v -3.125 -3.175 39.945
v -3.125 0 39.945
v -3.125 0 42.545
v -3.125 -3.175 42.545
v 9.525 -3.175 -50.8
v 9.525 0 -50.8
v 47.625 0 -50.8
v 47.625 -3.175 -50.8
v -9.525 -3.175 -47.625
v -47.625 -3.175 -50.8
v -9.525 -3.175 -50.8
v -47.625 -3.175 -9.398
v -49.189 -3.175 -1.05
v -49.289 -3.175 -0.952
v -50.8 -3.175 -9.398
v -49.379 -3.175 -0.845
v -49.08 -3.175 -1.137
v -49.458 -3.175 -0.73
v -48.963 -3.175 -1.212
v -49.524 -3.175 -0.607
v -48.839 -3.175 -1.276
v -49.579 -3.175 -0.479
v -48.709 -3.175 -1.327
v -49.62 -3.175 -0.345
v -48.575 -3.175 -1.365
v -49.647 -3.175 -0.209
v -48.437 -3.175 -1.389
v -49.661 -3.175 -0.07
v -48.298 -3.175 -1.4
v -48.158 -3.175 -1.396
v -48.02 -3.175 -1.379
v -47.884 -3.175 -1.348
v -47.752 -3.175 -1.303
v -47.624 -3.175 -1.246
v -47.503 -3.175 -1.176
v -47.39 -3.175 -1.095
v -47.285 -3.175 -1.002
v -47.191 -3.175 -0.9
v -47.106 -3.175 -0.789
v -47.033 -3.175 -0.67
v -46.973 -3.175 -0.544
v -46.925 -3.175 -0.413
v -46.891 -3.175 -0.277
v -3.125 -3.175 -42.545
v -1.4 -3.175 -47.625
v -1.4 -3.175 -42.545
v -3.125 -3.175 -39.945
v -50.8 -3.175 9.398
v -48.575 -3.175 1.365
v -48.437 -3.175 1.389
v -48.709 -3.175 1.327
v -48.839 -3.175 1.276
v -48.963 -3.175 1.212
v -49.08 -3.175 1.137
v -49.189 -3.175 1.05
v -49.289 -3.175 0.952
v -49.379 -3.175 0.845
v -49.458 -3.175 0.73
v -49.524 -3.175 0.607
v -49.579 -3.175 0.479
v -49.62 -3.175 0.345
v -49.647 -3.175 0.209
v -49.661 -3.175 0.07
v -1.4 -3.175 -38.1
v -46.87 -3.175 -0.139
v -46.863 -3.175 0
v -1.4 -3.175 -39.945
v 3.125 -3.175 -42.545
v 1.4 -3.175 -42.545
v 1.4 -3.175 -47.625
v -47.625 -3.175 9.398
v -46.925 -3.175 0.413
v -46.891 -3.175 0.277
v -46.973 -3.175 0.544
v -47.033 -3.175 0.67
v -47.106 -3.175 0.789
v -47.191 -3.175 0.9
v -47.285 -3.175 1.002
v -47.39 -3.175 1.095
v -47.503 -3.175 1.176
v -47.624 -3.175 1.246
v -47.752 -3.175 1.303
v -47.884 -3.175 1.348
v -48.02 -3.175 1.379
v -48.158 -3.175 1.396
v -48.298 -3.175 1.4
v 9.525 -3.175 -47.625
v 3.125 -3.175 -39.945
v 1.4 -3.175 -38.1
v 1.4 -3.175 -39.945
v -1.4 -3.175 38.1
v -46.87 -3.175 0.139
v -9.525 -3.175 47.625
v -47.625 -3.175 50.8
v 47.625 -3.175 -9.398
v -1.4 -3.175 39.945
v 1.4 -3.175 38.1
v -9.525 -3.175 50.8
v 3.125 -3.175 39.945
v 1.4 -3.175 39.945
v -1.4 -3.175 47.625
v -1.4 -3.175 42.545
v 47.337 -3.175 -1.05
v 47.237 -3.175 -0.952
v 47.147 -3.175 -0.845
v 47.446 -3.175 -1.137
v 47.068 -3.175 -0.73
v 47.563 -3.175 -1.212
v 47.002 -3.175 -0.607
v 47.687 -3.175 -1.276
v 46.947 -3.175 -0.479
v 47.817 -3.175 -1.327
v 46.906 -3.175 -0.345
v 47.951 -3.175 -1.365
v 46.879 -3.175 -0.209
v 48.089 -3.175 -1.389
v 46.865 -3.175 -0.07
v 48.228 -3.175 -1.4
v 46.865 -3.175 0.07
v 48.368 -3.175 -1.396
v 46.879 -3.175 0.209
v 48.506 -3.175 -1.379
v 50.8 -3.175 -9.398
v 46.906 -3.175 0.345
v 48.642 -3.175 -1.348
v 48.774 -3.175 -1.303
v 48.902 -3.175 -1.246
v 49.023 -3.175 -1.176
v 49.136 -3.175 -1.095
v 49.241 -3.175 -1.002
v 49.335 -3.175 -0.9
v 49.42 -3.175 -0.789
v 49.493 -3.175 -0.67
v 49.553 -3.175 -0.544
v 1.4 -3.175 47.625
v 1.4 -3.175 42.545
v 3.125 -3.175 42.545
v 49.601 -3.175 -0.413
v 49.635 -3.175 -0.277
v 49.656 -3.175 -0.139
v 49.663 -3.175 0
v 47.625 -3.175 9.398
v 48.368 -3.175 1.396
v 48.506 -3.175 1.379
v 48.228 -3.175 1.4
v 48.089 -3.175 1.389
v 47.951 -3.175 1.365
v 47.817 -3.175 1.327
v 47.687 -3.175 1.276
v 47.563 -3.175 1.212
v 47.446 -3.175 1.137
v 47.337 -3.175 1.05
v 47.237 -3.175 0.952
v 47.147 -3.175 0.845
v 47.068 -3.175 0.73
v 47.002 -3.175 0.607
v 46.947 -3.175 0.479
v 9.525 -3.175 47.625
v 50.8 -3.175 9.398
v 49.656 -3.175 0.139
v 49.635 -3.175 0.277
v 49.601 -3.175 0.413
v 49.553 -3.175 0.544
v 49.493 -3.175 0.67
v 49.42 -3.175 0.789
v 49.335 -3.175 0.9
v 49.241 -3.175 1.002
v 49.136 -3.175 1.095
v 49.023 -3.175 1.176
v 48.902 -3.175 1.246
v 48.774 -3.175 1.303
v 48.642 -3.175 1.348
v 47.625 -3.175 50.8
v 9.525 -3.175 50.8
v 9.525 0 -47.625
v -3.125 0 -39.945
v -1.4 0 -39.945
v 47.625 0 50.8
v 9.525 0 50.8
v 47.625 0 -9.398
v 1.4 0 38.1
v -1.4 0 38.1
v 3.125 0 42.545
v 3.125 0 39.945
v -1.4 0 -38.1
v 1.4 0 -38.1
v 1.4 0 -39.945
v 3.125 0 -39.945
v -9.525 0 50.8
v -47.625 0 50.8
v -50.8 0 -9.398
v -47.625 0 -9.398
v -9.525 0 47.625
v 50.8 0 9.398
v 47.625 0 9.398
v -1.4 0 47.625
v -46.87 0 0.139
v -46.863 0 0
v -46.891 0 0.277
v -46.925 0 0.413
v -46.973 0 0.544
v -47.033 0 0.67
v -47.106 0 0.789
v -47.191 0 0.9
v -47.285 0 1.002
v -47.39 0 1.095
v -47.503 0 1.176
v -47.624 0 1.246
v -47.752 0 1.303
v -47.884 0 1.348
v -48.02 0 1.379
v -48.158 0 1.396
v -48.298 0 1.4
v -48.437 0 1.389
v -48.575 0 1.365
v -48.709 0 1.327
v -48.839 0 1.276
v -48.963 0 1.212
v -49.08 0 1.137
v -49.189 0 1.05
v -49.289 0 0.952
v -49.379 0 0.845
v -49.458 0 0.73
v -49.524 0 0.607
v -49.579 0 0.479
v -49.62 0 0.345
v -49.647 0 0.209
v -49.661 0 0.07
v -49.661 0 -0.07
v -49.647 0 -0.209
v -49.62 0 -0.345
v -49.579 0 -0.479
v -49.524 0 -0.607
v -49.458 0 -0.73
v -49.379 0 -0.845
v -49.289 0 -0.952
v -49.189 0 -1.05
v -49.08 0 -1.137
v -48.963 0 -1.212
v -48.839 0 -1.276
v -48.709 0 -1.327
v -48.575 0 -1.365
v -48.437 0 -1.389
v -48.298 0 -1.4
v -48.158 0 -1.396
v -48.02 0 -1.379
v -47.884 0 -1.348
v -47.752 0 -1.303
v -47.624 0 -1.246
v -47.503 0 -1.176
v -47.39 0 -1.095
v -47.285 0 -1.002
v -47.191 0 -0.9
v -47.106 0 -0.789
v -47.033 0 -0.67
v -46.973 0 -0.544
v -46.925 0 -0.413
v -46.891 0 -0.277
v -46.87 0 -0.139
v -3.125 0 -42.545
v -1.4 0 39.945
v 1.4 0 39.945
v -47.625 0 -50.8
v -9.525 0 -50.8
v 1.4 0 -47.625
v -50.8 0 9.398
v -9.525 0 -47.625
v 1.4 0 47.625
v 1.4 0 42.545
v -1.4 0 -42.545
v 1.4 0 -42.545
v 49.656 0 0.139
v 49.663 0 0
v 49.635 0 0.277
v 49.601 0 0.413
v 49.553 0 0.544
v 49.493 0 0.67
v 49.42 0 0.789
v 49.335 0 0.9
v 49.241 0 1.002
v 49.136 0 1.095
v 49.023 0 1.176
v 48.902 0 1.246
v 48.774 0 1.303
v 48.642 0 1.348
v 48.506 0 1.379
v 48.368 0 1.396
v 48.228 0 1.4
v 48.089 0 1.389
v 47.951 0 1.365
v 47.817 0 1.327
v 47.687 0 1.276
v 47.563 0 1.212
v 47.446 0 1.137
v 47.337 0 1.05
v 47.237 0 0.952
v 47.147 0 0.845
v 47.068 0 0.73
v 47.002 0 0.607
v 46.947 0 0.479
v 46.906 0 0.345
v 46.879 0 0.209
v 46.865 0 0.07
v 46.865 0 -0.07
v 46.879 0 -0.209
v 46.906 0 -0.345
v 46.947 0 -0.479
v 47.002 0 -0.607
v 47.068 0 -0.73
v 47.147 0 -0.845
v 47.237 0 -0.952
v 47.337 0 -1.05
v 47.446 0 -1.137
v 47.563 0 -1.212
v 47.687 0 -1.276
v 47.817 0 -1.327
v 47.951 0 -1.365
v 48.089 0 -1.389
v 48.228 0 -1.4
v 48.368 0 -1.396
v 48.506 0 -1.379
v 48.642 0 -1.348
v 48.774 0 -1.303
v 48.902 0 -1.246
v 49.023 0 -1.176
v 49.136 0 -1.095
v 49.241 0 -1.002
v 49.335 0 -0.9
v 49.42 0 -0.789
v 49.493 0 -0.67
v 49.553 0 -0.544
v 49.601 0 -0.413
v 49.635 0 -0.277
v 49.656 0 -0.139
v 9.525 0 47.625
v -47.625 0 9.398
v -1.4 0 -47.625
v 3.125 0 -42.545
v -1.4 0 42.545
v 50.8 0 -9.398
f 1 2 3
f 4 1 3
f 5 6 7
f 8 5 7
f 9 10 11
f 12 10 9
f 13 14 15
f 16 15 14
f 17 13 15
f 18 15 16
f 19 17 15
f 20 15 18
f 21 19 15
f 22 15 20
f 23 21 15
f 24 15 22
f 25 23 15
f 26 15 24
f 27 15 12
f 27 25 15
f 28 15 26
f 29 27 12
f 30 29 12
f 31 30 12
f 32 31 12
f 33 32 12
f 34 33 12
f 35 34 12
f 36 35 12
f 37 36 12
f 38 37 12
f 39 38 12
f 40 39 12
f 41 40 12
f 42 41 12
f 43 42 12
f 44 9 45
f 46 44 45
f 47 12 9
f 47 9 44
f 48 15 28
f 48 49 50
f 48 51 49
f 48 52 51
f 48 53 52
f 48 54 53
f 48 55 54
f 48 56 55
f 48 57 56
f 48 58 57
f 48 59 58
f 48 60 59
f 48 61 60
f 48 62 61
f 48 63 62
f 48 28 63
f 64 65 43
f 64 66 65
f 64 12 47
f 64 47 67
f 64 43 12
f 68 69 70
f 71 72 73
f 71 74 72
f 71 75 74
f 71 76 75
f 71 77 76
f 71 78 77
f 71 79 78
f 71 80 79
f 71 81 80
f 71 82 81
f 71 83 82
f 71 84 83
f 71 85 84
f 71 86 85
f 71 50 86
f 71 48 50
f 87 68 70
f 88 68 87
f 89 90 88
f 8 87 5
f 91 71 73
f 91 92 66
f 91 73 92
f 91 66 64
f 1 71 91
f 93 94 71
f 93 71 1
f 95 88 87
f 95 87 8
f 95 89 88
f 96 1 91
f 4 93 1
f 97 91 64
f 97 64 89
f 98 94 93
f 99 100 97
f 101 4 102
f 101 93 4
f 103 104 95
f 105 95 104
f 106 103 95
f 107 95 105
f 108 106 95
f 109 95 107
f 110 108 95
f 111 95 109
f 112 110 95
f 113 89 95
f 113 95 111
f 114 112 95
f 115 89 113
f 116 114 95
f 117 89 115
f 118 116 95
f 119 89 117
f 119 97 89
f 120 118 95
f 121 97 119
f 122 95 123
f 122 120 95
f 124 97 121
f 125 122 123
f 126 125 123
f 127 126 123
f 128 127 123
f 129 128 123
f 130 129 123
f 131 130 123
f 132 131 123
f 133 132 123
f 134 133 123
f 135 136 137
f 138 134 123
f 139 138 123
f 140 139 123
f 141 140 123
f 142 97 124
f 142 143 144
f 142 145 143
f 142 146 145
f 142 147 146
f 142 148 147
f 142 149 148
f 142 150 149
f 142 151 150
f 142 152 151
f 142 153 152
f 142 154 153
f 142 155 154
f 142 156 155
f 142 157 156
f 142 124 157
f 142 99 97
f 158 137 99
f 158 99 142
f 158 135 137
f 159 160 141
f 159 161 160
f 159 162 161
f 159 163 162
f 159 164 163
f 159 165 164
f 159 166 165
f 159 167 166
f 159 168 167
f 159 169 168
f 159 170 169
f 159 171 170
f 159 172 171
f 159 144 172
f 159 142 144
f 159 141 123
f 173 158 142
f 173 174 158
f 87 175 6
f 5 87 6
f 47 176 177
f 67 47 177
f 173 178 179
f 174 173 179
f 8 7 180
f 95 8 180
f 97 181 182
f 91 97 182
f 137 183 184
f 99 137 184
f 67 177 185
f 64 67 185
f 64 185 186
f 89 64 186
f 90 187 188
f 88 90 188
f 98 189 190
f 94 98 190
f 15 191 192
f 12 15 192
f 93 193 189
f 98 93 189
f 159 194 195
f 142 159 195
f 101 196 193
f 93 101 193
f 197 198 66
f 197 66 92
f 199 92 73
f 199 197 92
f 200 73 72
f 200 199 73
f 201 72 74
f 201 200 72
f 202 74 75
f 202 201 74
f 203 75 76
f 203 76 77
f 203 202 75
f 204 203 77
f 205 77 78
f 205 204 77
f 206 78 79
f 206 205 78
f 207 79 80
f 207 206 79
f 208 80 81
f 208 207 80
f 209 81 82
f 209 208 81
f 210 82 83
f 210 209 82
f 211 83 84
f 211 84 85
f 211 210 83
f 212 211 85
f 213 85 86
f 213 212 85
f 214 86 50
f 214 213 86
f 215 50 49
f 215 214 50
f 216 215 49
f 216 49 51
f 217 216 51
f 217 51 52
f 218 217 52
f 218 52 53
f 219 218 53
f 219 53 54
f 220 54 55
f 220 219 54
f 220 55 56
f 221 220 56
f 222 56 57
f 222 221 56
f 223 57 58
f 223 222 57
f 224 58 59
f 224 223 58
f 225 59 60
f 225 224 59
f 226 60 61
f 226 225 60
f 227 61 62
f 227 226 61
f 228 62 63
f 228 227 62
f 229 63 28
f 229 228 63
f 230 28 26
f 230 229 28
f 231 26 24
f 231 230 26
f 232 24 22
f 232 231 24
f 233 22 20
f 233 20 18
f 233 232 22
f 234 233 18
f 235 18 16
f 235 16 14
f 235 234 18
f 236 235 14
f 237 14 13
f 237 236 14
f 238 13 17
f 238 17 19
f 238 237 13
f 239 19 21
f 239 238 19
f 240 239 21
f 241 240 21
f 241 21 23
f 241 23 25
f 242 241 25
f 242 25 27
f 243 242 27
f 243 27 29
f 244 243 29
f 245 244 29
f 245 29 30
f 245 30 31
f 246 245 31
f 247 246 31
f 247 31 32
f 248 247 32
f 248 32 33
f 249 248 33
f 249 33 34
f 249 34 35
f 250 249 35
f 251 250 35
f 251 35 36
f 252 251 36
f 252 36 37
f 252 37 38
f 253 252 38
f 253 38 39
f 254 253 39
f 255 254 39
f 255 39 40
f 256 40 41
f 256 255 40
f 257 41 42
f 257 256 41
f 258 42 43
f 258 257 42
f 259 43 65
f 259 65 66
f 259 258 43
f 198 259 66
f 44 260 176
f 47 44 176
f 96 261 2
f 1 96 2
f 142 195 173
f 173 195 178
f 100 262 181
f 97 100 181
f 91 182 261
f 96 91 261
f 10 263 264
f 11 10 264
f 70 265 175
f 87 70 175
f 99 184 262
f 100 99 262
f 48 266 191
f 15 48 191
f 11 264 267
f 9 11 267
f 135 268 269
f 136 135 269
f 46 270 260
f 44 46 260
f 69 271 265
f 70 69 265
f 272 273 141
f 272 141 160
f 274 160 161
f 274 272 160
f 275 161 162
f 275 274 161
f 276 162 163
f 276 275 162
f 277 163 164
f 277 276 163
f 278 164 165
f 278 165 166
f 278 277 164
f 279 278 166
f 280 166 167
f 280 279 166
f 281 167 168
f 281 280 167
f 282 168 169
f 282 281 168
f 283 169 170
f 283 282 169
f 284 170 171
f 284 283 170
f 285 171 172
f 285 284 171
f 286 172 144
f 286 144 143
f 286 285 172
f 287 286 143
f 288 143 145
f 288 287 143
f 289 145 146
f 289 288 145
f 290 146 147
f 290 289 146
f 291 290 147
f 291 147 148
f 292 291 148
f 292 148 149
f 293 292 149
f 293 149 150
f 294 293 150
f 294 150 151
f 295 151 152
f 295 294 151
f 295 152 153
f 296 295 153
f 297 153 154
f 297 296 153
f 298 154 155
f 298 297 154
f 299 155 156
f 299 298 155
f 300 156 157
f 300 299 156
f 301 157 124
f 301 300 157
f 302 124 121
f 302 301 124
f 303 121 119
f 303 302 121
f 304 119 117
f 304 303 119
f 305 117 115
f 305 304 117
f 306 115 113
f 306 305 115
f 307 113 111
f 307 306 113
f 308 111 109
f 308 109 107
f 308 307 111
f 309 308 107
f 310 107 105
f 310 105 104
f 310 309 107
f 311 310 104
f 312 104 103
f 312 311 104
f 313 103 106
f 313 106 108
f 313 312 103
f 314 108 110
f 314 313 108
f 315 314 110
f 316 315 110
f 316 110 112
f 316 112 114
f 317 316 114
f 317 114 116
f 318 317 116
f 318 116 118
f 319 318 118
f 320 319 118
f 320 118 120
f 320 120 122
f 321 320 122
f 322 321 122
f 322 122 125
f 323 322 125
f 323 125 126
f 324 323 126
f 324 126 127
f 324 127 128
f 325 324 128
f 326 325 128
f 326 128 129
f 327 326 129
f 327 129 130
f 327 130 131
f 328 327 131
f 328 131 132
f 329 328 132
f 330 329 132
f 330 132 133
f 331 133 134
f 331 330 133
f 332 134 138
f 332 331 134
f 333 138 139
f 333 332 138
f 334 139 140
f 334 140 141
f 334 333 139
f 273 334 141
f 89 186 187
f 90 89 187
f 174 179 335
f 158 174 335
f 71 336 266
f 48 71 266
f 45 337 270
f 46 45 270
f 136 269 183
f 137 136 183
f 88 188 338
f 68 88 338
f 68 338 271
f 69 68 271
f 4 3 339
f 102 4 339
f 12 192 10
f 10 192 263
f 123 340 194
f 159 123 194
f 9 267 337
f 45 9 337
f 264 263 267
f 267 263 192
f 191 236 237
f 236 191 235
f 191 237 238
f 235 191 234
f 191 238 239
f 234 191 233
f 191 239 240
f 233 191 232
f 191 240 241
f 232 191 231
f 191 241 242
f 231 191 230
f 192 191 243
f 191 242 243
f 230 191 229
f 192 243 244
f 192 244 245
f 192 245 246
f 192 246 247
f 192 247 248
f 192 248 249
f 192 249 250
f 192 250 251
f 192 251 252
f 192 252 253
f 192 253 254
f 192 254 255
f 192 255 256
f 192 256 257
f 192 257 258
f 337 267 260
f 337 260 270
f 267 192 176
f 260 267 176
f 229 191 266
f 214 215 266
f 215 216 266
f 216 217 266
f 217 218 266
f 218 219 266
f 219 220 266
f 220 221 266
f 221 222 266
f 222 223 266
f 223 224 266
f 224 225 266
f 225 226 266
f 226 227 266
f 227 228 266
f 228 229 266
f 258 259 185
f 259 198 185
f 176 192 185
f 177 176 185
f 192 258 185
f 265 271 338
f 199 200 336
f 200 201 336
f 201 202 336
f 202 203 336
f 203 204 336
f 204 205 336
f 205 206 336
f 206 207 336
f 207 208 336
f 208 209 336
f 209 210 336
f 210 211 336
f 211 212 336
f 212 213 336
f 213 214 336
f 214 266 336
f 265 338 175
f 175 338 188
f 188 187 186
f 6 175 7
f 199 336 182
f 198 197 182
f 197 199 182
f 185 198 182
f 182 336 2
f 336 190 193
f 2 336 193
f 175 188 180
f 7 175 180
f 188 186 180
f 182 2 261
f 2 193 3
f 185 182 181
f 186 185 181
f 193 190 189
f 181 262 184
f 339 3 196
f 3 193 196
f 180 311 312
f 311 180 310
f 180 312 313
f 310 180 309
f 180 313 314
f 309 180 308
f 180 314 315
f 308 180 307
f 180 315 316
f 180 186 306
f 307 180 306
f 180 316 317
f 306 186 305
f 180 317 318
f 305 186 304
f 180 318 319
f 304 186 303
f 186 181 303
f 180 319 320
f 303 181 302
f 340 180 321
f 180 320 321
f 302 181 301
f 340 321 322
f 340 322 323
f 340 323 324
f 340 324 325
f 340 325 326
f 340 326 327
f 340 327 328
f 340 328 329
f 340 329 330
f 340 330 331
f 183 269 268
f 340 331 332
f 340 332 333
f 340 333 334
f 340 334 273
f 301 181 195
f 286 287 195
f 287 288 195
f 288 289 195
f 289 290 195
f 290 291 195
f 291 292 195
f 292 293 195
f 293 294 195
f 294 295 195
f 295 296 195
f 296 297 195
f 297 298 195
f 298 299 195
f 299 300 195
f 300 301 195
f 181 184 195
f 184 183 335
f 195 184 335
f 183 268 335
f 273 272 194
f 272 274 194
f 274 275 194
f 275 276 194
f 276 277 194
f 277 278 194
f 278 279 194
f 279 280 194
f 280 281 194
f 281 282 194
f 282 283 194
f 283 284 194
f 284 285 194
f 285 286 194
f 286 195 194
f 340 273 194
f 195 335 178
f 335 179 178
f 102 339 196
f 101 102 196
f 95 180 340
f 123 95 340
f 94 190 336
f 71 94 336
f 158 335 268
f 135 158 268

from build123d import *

# Parameters (mm, degrees)
F0_R     = 1.4
F1_DEPTH = 3.175


with BuildPart() as f1:
    # F0 (on Front) → F1 (new body)
    with BuildSketch(Plane.XZ):
        Polygon((9.525, -50.8), (47.625, -50.8), (47.625, -9.398), (50.8, -9.398), (50.8, 9.398), (47.625, 9.398), (47.625, 50.8), (9.525, 50.8), (9.525, 47.625), (1.4, 47.625), (1.4, 42.545), (3.125, 42.545), (3.125, 39.945), (1.4, 39.945), (1.4, 38.1), (-1.4, 38.1), (-1.4, 39.945), (-3.125, 39.945), (-3.125, 42.545), (-1.4, 42.545), (-1.4, 47.625), (-9.525, 47.625), (-9.525, 50.8), (-47.625, 50.8), (-47.625, 9.398), (-50.8, 9.398), (-50.8, -9.398), (-47.625, -9.398), (-47.625, -50.8), (-9.525, -50.8), (-9.525, -47.625), (-1.4, -47.625), (-1.4, -42.545), (-3.125, -42.545), (-3.125, -39.945), (-1.4, -39.945), (-1.4, -38.1), (1.4, -38.1), (1.4, -39.945), (3.125, -39.945), (3.125, -42.545), (1.4, -42.545), (1.4, -47.625), (9.525, -47.625), align=None)
        with Locations((-48.263, 0)):
            Circle(F0_R, mode=Mode.SUBTRACT)
        with Locations((48.263, 0)):
            Circle(F0_R, mode=Mode.SUBTRACT)
    extrude(amount=F1_DEPTH)


solid = f1.part
